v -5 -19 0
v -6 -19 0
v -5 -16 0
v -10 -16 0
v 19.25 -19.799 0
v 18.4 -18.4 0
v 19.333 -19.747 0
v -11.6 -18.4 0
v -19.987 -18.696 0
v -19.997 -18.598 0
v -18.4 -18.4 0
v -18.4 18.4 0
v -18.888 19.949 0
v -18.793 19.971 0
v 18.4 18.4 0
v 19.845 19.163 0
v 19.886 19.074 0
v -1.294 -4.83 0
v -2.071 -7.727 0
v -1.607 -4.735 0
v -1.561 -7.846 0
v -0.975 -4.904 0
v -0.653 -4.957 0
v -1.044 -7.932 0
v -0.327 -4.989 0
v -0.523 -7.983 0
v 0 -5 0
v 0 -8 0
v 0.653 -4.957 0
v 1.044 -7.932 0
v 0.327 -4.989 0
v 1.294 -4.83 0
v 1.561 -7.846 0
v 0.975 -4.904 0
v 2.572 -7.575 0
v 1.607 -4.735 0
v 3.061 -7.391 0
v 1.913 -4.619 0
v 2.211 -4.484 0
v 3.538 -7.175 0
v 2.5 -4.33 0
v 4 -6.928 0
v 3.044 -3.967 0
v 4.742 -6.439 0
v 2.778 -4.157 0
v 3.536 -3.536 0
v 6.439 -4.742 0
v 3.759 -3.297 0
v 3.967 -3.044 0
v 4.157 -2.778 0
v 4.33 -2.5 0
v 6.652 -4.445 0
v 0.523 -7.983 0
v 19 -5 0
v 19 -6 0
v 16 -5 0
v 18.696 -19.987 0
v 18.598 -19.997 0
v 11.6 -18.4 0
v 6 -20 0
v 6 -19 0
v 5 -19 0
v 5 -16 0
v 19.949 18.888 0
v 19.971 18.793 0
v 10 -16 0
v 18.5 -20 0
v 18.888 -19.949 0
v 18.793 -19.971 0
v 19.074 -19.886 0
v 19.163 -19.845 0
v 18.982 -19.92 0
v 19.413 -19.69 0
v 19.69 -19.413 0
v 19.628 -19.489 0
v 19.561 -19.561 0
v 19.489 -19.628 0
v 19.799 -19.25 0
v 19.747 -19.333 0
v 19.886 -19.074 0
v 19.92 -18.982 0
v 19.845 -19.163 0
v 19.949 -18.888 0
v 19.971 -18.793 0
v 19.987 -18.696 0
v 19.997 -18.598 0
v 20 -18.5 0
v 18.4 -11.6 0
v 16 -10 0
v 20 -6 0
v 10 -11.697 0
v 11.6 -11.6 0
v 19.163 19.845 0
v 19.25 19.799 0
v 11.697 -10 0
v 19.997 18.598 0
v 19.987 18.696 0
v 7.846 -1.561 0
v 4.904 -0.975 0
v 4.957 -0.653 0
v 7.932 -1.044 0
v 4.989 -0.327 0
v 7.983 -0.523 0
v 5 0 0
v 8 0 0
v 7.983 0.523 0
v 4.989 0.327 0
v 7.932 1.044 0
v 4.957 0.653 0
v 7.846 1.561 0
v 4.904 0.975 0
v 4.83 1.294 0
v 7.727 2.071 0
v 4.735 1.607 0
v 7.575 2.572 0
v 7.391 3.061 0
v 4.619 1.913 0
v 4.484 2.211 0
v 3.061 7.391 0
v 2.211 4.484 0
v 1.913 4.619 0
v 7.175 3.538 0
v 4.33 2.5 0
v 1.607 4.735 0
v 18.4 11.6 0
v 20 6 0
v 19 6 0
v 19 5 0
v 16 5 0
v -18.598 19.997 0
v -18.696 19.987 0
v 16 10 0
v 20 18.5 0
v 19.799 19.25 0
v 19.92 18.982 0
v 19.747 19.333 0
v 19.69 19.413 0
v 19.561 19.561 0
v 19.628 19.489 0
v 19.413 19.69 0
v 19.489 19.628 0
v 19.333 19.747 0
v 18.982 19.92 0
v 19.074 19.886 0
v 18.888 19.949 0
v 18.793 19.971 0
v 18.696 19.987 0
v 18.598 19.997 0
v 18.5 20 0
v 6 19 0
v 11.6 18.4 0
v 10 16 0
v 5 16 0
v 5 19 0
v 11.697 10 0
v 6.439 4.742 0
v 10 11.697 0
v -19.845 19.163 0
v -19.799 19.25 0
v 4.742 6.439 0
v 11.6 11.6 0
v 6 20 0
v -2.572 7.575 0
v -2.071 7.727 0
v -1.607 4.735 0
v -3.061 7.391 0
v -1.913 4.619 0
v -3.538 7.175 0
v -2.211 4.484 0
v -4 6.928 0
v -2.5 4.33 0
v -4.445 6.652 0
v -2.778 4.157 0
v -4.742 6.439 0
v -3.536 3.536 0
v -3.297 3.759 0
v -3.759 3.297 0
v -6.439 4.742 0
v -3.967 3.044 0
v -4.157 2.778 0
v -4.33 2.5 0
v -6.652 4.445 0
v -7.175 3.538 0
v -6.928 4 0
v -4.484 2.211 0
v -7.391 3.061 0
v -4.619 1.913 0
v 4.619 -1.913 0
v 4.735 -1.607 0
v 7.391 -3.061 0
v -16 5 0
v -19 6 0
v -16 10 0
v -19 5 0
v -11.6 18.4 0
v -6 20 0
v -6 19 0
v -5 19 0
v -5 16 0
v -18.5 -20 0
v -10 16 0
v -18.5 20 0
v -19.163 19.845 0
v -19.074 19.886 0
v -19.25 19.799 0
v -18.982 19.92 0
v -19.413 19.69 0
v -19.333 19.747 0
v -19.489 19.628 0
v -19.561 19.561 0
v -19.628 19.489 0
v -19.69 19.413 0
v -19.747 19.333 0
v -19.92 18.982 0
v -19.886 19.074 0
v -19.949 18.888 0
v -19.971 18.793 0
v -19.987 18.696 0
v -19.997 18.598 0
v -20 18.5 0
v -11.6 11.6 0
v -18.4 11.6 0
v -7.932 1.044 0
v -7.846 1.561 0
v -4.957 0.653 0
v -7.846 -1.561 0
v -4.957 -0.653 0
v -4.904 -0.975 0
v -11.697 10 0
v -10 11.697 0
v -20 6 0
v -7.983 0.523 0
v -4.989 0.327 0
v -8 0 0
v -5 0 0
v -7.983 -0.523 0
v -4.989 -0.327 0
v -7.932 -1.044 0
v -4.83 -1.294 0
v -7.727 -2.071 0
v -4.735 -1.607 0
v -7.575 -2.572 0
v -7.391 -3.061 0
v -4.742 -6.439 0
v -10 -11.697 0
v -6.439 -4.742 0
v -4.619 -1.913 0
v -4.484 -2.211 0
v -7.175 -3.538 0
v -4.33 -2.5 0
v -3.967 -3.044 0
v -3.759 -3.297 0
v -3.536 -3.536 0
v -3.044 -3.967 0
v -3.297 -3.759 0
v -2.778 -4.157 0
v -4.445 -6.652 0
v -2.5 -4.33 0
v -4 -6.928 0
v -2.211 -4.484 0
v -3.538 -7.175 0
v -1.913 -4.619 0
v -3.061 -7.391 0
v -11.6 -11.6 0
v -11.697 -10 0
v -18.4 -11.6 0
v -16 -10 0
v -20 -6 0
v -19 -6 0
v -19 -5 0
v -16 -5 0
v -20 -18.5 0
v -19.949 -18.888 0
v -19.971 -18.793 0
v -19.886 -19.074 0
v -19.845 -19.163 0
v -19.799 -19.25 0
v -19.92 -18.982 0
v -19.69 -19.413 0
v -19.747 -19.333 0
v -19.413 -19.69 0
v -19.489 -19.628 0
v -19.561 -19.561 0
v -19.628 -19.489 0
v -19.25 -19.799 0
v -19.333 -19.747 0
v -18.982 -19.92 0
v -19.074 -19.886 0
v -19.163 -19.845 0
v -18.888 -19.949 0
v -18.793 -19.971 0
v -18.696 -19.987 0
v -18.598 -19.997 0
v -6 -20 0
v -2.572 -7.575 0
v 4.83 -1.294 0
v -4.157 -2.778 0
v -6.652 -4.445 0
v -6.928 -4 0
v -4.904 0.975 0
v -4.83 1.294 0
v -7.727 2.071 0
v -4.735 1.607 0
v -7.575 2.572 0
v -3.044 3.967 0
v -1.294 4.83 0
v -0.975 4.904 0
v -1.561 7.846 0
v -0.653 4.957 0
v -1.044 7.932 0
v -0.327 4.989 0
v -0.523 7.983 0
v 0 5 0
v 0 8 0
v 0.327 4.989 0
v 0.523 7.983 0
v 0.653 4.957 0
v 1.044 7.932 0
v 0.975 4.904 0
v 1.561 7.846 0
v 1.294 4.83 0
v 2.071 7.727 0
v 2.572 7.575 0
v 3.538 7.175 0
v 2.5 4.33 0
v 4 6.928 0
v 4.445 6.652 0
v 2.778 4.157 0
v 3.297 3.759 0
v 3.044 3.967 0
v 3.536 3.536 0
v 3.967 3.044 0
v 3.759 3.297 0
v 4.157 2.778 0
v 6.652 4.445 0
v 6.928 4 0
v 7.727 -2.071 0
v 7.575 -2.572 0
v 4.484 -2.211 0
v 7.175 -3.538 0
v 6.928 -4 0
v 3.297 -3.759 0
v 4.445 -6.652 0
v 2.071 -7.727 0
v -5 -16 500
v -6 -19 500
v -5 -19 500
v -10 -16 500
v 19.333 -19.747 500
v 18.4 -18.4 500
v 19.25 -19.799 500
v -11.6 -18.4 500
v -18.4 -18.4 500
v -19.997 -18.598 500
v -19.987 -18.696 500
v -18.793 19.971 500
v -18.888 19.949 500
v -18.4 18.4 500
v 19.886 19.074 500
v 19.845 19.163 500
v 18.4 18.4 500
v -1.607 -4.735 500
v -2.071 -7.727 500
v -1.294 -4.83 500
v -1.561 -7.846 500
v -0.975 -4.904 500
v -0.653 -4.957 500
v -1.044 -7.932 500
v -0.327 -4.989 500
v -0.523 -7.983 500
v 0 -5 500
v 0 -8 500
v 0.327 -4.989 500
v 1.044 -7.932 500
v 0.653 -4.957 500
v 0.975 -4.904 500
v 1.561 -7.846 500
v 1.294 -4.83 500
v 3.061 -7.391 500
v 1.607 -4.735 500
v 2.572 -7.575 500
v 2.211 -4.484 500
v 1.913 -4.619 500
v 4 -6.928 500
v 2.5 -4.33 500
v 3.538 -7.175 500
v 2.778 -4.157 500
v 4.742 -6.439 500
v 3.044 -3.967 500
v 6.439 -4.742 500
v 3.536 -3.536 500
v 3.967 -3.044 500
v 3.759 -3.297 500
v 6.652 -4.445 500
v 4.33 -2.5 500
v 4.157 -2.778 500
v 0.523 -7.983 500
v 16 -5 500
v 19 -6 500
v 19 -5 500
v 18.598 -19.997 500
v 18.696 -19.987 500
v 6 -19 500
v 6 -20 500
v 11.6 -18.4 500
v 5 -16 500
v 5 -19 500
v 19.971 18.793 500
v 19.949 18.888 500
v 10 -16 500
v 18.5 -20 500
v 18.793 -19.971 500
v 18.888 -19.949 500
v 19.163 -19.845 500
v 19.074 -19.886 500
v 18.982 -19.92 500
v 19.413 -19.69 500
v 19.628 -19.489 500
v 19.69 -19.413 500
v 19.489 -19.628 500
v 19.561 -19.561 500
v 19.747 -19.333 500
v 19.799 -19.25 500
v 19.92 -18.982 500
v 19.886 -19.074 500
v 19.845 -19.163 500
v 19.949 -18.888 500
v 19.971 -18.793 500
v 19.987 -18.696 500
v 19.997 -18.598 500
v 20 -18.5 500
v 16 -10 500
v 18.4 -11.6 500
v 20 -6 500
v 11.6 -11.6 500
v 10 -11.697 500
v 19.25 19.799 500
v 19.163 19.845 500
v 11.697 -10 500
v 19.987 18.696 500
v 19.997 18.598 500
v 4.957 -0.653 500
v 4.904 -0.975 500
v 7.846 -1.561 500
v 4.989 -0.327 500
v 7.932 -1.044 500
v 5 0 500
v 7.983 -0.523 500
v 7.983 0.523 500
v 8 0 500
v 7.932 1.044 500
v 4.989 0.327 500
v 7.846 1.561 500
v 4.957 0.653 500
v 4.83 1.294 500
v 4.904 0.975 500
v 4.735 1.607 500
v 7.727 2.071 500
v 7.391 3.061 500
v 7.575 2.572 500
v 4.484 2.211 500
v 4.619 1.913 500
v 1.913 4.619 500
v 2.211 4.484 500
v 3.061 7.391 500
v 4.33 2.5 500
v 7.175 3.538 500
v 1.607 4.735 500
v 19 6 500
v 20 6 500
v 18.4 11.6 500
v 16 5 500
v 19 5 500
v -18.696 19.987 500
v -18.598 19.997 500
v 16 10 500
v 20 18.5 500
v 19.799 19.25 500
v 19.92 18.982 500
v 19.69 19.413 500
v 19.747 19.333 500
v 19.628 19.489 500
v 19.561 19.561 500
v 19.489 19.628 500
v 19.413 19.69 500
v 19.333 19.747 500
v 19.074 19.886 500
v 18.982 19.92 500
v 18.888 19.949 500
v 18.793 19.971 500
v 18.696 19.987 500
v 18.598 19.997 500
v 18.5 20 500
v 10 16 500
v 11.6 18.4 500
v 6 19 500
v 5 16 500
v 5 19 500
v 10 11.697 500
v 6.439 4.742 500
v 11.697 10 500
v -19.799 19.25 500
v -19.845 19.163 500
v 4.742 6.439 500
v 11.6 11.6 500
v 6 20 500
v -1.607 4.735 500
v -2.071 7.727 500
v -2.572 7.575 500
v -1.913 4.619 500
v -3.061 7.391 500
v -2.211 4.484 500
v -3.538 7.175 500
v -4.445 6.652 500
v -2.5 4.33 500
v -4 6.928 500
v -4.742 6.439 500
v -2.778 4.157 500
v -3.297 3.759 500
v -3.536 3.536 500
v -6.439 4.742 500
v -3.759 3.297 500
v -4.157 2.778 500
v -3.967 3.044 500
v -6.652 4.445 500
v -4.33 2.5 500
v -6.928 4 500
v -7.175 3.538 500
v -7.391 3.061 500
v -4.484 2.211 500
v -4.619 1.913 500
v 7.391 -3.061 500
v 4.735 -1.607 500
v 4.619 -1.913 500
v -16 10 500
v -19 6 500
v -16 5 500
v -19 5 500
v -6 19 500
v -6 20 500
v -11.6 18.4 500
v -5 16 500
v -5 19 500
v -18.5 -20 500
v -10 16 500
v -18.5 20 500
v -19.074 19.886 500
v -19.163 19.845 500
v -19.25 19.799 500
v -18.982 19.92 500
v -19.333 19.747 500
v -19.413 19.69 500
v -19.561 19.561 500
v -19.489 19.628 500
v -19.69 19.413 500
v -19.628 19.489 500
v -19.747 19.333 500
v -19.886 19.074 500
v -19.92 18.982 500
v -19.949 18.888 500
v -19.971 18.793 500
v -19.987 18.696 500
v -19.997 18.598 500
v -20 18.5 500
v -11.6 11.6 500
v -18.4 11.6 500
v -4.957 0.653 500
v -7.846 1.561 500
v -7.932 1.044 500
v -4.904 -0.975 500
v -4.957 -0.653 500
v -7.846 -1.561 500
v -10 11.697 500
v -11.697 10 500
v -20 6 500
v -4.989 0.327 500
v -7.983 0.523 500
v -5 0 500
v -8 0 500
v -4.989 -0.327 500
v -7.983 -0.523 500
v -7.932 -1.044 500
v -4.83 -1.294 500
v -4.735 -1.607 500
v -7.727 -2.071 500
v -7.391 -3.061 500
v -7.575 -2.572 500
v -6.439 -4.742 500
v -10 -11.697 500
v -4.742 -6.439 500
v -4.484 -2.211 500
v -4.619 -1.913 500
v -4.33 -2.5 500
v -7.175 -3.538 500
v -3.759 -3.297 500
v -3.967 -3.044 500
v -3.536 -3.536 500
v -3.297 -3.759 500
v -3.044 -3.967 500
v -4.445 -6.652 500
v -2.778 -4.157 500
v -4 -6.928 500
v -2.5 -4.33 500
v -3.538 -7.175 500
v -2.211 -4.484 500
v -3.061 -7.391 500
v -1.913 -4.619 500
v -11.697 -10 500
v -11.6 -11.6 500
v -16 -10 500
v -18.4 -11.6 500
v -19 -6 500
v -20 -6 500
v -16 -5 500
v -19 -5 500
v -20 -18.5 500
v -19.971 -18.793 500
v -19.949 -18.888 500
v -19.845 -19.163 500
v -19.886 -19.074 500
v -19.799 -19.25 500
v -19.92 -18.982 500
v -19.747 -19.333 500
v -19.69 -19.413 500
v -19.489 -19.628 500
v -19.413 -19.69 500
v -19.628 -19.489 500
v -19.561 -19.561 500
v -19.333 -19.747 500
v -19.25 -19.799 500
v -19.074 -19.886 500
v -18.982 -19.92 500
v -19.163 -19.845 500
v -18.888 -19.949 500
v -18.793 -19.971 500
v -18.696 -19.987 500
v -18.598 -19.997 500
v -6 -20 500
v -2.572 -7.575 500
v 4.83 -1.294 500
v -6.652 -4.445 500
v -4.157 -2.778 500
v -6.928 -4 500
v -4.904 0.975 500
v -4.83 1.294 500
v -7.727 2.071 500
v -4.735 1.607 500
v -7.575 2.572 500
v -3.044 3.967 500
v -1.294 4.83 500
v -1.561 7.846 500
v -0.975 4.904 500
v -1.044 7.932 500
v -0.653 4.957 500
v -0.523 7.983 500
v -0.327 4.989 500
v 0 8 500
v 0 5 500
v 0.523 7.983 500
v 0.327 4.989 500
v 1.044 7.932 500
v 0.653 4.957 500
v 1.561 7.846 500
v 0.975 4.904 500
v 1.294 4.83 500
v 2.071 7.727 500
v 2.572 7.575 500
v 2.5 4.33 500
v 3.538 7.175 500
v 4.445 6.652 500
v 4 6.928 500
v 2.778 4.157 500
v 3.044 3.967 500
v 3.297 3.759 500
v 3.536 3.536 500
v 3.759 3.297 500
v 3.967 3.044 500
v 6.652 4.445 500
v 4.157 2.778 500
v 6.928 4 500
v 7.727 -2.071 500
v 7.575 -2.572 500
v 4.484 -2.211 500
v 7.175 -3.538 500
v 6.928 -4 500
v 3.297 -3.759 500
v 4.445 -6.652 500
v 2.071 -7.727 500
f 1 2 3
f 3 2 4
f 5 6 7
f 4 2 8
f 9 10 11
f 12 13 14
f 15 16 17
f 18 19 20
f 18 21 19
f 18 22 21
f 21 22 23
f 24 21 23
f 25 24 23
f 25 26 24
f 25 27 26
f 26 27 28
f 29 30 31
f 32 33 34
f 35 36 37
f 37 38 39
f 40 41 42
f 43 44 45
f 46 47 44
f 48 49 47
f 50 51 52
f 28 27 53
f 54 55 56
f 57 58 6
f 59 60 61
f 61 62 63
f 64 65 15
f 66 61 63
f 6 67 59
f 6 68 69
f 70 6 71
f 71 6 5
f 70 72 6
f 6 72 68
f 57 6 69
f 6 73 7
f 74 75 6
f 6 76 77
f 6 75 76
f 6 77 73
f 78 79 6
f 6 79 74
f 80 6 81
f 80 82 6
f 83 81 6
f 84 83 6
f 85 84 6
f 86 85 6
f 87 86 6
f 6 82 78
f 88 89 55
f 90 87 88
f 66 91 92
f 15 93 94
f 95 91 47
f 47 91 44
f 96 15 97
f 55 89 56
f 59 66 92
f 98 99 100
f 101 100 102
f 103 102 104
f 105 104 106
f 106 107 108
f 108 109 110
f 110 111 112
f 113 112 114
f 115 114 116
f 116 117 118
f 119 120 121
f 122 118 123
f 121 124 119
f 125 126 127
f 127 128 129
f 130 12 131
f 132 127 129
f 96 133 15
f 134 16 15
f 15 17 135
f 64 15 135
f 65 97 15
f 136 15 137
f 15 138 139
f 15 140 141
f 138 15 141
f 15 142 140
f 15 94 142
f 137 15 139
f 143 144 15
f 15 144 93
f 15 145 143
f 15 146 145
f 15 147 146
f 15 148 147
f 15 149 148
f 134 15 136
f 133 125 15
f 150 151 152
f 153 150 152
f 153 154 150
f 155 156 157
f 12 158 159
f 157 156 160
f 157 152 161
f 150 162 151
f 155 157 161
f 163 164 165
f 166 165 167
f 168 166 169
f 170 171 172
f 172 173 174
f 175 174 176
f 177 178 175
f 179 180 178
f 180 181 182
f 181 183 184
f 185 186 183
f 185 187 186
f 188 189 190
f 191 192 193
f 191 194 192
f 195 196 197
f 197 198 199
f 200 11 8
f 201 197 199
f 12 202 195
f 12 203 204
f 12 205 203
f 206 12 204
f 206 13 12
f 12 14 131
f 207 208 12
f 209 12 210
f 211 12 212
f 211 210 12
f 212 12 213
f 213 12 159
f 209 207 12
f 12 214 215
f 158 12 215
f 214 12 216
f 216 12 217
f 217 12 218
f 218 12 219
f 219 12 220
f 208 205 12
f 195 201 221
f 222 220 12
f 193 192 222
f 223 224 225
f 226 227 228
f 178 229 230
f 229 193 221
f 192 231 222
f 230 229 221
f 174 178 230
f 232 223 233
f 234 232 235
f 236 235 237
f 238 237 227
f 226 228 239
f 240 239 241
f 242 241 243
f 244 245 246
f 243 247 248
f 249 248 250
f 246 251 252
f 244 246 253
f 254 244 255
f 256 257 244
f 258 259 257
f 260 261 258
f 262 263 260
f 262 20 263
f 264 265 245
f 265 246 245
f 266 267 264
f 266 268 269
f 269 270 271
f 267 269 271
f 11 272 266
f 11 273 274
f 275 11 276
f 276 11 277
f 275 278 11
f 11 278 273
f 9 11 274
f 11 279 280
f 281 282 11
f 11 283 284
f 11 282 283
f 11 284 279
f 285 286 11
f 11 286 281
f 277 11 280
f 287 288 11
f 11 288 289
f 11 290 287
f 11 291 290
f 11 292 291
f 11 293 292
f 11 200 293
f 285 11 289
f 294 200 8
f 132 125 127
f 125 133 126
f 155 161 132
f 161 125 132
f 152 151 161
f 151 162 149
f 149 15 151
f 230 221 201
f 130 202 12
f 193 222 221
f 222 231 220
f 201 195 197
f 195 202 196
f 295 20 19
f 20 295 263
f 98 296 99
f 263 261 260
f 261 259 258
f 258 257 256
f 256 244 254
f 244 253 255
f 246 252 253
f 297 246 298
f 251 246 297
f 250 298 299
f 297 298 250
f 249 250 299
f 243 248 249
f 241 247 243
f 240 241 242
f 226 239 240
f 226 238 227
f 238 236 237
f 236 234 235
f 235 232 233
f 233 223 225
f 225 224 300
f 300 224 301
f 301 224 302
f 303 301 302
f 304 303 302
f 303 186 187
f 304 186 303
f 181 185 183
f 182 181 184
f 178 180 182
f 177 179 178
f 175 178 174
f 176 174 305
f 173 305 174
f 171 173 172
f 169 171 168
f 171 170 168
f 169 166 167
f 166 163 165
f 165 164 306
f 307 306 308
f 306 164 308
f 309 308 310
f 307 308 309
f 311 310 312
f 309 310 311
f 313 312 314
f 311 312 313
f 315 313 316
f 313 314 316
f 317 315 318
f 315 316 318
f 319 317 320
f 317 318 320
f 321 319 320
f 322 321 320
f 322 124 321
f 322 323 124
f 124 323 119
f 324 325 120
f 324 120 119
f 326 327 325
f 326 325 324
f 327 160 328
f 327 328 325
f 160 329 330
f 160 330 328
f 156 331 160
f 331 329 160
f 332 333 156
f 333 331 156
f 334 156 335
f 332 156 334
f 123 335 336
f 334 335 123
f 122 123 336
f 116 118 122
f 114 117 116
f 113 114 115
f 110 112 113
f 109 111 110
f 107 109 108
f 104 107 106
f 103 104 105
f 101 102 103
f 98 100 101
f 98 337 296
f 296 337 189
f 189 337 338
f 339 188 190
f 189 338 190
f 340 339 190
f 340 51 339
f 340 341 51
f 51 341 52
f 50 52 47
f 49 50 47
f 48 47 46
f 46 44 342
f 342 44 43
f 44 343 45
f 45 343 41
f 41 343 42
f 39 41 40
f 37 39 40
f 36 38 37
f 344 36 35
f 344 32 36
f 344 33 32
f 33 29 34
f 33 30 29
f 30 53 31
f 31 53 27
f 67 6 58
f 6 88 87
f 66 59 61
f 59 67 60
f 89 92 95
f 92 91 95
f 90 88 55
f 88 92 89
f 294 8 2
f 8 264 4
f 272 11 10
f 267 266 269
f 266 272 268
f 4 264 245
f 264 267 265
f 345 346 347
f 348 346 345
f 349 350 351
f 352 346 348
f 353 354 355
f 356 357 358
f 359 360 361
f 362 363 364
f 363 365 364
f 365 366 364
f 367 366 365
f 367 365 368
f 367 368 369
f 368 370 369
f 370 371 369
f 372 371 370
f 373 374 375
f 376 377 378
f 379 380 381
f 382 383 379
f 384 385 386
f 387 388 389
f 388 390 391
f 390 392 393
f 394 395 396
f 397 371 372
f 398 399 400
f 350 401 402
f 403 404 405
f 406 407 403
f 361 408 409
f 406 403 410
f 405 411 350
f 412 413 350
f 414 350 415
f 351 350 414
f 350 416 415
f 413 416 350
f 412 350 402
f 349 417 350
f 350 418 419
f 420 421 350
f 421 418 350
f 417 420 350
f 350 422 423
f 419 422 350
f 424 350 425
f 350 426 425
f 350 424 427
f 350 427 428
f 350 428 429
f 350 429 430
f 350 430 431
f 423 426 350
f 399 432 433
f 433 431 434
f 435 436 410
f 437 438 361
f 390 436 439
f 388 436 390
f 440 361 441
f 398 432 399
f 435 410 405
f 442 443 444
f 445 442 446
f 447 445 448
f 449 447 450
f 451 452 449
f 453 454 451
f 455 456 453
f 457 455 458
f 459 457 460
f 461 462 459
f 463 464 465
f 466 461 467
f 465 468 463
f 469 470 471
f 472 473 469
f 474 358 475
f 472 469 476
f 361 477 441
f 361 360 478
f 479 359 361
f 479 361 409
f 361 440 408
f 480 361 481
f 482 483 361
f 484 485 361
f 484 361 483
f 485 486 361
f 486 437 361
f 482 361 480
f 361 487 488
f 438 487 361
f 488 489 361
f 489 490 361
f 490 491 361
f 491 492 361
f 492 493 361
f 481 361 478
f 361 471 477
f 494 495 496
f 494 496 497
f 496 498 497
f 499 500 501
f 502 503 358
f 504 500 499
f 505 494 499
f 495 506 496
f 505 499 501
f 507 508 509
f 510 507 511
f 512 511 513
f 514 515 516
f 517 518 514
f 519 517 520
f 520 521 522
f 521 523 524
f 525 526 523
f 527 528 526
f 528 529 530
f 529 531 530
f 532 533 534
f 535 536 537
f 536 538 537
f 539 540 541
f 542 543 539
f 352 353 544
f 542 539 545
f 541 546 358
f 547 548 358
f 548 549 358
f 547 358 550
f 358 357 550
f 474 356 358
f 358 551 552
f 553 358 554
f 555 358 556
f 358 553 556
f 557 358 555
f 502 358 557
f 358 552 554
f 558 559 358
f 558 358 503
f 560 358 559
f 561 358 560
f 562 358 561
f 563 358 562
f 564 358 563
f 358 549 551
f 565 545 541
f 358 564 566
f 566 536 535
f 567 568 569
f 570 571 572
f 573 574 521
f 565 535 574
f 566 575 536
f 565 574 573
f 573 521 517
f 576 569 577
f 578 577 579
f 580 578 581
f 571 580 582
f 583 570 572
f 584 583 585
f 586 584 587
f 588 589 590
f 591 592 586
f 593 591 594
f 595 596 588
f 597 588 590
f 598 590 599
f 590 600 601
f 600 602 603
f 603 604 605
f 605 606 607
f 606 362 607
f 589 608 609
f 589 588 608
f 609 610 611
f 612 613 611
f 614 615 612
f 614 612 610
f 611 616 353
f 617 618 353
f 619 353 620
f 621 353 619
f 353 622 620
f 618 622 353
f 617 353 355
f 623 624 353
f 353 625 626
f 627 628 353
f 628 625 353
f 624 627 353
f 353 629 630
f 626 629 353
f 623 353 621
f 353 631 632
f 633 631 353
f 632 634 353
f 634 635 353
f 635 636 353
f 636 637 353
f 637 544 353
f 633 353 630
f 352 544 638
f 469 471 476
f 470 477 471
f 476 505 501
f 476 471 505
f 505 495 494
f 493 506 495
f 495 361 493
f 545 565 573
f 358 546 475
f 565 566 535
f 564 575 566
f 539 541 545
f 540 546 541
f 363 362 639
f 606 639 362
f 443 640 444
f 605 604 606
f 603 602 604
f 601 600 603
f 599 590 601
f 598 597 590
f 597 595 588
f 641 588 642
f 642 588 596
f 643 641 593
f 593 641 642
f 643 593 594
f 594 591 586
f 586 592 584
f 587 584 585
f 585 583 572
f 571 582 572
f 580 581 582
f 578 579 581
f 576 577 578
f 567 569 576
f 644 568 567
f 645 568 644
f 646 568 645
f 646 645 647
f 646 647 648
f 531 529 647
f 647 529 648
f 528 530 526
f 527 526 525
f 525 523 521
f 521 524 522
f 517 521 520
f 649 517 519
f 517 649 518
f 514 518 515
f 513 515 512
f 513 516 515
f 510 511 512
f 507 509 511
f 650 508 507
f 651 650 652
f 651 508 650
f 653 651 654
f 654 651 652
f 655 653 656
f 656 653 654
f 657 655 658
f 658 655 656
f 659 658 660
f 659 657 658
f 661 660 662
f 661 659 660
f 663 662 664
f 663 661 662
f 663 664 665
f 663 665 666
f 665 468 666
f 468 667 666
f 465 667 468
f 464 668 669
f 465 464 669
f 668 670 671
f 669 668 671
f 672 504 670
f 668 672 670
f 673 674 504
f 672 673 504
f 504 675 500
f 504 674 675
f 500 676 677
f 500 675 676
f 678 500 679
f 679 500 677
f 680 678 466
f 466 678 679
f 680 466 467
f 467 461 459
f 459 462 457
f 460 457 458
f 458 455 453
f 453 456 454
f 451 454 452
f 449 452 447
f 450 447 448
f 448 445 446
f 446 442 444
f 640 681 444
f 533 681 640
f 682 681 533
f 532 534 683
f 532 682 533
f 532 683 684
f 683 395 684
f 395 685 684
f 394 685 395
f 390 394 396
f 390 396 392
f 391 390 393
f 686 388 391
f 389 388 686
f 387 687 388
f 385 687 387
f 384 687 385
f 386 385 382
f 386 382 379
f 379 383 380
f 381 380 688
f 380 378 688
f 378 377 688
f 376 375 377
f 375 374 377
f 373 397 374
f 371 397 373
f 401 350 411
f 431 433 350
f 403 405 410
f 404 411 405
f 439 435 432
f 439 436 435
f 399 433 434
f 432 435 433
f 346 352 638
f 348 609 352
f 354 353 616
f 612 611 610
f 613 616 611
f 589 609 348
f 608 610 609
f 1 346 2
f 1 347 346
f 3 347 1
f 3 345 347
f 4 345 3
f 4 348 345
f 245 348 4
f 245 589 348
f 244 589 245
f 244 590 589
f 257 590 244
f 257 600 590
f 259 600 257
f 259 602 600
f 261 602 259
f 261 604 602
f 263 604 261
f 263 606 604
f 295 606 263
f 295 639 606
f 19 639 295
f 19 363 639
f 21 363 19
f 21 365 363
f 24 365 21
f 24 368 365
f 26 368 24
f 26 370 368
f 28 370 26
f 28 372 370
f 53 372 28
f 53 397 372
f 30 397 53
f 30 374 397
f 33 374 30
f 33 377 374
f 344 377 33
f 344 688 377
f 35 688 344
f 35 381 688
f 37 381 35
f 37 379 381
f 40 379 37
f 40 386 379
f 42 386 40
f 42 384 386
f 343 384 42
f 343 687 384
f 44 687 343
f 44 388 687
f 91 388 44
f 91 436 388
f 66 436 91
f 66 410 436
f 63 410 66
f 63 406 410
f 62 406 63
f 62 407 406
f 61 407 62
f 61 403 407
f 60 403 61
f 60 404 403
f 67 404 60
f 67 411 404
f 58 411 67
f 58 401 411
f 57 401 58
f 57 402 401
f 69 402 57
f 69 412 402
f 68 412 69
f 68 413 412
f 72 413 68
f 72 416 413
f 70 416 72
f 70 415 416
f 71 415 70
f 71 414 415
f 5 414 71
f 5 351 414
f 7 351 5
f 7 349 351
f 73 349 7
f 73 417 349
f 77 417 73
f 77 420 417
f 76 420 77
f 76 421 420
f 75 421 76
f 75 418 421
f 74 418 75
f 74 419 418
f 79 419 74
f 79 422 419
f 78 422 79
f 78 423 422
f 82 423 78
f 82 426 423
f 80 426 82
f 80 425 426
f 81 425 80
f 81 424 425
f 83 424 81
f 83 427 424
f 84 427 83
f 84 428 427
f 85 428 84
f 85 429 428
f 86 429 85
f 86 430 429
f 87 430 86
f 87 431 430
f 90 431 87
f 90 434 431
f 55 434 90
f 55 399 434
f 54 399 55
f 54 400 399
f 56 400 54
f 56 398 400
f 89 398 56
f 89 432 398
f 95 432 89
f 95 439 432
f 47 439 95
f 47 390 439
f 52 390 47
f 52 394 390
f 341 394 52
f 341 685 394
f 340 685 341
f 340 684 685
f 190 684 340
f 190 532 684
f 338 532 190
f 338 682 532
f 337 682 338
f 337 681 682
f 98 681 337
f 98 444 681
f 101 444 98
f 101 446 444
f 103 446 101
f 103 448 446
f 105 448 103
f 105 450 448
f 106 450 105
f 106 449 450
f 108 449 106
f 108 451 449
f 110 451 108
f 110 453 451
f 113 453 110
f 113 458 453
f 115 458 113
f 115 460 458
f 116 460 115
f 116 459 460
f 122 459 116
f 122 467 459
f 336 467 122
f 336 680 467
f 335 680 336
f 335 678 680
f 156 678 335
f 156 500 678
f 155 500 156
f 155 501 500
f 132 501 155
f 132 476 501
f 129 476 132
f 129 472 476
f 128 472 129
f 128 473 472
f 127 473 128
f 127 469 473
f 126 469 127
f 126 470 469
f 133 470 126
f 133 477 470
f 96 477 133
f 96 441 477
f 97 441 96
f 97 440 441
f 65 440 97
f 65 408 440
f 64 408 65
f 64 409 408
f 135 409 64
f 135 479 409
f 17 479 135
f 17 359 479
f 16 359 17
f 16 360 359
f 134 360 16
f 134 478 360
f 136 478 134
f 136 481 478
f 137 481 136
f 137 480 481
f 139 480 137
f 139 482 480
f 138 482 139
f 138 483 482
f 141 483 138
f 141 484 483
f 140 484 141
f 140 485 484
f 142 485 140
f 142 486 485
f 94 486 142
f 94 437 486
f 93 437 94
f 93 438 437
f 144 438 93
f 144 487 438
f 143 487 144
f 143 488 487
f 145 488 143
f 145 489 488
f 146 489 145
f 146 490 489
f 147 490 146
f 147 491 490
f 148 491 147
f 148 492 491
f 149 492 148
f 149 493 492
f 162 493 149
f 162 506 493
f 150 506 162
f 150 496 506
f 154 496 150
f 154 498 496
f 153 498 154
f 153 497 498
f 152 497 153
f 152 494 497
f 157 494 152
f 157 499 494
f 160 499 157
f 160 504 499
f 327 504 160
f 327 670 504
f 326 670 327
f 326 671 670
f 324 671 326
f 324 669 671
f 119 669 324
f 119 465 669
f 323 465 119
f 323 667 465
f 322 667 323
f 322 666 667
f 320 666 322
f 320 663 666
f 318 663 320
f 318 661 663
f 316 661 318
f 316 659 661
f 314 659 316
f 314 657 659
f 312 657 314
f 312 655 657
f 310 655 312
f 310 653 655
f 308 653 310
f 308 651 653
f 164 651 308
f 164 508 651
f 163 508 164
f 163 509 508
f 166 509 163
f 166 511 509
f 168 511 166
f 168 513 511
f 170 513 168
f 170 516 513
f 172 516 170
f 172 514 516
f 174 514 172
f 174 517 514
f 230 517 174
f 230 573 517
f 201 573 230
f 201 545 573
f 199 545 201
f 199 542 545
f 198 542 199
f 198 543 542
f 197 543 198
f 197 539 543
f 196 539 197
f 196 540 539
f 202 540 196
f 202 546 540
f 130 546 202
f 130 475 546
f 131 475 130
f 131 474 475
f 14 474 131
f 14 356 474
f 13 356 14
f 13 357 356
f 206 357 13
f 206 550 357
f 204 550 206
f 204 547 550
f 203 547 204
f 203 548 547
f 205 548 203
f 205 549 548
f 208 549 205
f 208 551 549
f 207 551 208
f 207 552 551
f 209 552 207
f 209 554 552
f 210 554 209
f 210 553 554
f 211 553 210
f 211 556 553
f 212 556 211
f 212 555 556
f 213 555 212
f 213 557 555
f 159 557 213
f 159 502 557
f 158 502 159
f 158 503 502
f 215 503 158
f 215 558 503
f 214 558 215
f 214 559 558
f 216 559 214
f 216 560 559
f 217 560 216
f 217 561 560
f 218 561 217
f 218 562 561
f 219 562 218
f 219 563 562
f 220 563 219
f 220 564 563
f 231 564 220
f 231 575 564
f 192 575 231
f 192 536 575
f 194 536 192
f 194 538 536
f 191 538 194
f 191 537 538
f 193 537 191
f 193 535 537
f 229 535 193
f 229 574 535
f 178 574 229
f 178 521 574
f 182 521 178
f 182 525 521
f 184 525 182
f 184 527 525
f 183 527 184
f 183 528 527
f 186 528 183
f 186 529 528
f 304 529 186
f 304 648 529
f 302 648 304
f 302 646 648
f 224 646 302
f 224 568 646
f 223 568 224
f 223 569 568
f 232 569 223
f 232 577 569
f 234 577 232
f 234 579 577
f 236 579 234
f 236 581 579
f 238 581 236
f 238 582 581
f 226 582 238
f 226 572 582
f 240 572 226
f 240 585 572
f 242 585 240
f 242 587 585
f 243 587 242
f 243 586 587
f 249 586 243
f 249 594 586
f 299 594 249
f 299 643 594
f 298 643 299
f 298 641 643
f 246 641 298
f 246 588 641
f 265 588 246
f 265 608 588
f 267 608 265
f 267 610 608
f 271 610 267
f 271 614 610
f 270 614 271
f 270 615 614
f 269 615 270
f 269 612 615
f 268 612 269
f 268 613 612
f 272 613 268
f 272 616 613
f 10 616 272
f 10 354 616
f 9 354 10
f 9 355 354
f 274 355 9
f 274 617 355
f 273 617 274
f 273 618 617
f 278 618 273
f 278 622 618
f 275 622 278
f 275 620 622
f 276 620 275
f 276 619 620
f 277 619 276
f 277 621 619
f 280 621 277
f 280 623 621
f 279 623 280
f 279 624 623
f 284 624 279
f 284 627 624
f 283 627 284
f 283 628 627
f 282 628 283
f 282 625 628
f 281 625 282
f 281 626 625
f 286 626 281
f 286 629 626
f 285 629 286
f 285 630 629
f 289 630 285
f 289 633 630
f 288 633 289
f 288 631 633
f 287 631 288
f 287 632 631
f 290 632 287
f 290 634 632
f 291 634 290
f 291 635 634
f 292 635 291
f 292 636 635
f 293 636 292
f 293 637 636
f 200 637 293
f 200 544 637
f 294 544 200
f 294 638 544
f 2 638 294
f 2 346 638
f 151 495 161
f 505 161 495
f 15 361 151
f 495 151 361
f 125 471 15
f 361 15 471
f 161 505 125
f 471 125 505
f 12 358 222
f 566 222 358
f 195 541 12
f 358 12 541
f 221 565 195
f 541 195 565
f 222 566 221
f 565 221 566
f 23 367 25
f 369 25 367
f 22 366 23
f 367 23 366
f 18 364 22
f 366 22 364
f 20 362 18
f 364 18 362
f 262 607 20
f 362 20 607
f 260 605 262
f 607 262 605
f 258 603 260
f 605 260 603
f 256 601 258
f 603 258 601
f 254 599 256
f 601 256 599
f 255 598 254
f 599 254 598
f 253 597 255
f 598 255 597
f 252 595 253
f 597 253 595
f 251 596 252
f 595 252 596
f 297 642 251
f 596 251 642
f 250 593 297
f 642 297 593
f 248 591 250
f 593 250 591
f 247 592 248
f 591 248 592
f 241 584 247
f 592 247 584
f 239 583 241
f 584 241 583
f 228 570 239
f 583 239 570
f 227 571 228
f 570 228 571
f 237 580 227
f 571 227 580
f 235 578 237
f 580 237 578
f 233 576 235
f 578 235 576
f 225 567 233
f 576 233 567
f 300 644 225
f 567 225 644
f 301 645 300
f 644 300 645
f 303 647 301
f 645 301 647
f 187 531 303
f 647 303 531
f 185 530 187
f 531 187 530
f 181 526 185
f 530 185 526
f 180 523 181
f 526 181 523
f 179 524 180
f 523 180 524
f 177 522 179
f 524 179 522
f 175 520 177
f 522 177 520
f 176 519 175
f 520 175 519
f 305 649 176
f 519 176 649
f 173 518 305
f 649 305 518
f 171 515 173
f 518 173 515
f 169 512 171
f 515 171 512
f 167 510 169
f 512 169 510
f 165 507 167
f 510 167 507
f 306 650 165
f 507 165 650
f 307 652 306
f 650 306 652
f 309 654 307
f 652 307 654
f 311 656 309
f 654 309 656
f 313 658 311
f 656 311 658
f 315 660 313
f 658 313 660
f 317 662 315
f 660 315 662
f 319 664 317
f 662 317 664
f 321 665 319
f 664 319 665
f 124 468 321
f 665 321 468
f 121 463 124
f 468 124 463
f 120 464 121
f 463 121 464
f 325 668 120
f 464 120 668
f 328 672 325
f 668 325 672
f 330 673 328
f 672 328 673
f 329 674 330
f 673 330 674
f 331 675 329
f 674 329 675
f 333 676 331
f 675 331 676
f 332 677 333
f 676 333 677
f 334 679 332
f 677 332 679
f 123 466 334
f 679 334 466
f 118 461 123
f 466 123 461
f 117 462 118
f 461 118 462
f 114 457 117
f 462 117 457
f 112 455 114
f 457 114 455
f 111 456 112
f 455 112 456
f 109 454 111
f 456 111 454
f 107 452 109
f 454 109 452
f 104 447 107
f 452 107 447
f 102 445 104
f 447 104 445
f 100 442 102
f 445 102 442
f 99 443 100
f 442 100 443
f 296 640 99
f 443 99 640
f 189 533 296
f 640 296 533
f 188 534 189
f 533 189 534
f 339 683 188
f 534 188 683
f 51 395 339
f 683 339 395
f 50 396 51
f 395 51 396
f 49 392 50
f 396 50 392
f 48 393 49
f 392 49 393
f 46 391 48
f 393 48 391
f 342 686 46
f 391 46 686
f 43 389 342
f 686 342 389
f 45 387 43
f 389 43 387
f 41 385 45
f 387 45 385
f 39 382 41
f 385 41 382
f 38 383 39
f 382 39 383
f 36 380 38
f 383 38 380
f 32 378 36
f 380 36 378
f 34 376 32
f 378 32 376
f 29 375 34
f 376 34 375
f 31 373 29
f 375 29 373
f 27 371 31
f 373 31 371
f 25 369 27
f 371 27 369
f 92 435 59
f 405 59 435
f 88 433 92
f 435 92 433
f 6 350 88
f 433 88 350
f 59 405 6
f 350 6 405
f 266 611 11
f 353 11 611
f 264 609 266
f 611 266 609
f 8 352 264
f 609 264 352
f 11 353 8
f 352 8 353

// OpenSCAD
// SPDX-License-Identifier: GPL-3.0-or-later
// Adapted for square profiles from NopSCADlib, Copyright Chris Palmer 2020.
// https://github.com/nophead/NopSCADlib/blob/master/vitamins/extrusion.scad
// https://github.com/nophead/NopSCADlib/blob/master/vitamins/extrusions.scad
// Changes: standalone square-only section, removed BOM/visual dependencies, zero-based extrusion.
series=40; length=500; $fn=96;
// width, center hole (-diameter), corner hole (-diameter), center square, slot, inner slot, tab, spar, fillet
p=series==20?[20,-4.2,0,8,6,12,2,2,1]:series==30?[30,-6.8,-4.2,12,8,16.5,2,2,1]:[40,-10,6.8,-16,10,20,4,2.4,1.5];
module hole(d){if(d>0)square(d,center=true);else if(d<0)circle(d=-d);}
module section(p){
 w=p[0]; cs=abs(p[3]); cw=p[4]; corner=(w-p[5])/2; tab=p[6]; spar=p[7]; f=p[8];
 union(){
  difference(){union(){hole(p[3]);for(j=[0:3])rotate(45+90*j)translate([cs/2-spar/2,-spar/2])square([w/sqrt(2)-corner*sqrt(2)-cs/2+spar*(1+tan(22.5)),spar]);}hole(p[1]);}
  for(a=[0:90:270])rotate(a)translate([-w/2,-w/2])difference(){union(){translate([f,0])square([(w-cw)/2-f,tab]);translate([0,f])square([tab,(w-cw)/2-f]);translate([f,f])circle(f);translate([f,f])square([corner-f,corner-f]);}translate([corner/2,corner/2])hole(p[2]);}
 }
}
assert(series==20||series==30||series==40);assert(length>0);
linear_extrude(height=length,convexity=8)difference(){section(p);for(a=[0:90:270])rotate(a)translate([20,0])square([2,12],center=true);}
